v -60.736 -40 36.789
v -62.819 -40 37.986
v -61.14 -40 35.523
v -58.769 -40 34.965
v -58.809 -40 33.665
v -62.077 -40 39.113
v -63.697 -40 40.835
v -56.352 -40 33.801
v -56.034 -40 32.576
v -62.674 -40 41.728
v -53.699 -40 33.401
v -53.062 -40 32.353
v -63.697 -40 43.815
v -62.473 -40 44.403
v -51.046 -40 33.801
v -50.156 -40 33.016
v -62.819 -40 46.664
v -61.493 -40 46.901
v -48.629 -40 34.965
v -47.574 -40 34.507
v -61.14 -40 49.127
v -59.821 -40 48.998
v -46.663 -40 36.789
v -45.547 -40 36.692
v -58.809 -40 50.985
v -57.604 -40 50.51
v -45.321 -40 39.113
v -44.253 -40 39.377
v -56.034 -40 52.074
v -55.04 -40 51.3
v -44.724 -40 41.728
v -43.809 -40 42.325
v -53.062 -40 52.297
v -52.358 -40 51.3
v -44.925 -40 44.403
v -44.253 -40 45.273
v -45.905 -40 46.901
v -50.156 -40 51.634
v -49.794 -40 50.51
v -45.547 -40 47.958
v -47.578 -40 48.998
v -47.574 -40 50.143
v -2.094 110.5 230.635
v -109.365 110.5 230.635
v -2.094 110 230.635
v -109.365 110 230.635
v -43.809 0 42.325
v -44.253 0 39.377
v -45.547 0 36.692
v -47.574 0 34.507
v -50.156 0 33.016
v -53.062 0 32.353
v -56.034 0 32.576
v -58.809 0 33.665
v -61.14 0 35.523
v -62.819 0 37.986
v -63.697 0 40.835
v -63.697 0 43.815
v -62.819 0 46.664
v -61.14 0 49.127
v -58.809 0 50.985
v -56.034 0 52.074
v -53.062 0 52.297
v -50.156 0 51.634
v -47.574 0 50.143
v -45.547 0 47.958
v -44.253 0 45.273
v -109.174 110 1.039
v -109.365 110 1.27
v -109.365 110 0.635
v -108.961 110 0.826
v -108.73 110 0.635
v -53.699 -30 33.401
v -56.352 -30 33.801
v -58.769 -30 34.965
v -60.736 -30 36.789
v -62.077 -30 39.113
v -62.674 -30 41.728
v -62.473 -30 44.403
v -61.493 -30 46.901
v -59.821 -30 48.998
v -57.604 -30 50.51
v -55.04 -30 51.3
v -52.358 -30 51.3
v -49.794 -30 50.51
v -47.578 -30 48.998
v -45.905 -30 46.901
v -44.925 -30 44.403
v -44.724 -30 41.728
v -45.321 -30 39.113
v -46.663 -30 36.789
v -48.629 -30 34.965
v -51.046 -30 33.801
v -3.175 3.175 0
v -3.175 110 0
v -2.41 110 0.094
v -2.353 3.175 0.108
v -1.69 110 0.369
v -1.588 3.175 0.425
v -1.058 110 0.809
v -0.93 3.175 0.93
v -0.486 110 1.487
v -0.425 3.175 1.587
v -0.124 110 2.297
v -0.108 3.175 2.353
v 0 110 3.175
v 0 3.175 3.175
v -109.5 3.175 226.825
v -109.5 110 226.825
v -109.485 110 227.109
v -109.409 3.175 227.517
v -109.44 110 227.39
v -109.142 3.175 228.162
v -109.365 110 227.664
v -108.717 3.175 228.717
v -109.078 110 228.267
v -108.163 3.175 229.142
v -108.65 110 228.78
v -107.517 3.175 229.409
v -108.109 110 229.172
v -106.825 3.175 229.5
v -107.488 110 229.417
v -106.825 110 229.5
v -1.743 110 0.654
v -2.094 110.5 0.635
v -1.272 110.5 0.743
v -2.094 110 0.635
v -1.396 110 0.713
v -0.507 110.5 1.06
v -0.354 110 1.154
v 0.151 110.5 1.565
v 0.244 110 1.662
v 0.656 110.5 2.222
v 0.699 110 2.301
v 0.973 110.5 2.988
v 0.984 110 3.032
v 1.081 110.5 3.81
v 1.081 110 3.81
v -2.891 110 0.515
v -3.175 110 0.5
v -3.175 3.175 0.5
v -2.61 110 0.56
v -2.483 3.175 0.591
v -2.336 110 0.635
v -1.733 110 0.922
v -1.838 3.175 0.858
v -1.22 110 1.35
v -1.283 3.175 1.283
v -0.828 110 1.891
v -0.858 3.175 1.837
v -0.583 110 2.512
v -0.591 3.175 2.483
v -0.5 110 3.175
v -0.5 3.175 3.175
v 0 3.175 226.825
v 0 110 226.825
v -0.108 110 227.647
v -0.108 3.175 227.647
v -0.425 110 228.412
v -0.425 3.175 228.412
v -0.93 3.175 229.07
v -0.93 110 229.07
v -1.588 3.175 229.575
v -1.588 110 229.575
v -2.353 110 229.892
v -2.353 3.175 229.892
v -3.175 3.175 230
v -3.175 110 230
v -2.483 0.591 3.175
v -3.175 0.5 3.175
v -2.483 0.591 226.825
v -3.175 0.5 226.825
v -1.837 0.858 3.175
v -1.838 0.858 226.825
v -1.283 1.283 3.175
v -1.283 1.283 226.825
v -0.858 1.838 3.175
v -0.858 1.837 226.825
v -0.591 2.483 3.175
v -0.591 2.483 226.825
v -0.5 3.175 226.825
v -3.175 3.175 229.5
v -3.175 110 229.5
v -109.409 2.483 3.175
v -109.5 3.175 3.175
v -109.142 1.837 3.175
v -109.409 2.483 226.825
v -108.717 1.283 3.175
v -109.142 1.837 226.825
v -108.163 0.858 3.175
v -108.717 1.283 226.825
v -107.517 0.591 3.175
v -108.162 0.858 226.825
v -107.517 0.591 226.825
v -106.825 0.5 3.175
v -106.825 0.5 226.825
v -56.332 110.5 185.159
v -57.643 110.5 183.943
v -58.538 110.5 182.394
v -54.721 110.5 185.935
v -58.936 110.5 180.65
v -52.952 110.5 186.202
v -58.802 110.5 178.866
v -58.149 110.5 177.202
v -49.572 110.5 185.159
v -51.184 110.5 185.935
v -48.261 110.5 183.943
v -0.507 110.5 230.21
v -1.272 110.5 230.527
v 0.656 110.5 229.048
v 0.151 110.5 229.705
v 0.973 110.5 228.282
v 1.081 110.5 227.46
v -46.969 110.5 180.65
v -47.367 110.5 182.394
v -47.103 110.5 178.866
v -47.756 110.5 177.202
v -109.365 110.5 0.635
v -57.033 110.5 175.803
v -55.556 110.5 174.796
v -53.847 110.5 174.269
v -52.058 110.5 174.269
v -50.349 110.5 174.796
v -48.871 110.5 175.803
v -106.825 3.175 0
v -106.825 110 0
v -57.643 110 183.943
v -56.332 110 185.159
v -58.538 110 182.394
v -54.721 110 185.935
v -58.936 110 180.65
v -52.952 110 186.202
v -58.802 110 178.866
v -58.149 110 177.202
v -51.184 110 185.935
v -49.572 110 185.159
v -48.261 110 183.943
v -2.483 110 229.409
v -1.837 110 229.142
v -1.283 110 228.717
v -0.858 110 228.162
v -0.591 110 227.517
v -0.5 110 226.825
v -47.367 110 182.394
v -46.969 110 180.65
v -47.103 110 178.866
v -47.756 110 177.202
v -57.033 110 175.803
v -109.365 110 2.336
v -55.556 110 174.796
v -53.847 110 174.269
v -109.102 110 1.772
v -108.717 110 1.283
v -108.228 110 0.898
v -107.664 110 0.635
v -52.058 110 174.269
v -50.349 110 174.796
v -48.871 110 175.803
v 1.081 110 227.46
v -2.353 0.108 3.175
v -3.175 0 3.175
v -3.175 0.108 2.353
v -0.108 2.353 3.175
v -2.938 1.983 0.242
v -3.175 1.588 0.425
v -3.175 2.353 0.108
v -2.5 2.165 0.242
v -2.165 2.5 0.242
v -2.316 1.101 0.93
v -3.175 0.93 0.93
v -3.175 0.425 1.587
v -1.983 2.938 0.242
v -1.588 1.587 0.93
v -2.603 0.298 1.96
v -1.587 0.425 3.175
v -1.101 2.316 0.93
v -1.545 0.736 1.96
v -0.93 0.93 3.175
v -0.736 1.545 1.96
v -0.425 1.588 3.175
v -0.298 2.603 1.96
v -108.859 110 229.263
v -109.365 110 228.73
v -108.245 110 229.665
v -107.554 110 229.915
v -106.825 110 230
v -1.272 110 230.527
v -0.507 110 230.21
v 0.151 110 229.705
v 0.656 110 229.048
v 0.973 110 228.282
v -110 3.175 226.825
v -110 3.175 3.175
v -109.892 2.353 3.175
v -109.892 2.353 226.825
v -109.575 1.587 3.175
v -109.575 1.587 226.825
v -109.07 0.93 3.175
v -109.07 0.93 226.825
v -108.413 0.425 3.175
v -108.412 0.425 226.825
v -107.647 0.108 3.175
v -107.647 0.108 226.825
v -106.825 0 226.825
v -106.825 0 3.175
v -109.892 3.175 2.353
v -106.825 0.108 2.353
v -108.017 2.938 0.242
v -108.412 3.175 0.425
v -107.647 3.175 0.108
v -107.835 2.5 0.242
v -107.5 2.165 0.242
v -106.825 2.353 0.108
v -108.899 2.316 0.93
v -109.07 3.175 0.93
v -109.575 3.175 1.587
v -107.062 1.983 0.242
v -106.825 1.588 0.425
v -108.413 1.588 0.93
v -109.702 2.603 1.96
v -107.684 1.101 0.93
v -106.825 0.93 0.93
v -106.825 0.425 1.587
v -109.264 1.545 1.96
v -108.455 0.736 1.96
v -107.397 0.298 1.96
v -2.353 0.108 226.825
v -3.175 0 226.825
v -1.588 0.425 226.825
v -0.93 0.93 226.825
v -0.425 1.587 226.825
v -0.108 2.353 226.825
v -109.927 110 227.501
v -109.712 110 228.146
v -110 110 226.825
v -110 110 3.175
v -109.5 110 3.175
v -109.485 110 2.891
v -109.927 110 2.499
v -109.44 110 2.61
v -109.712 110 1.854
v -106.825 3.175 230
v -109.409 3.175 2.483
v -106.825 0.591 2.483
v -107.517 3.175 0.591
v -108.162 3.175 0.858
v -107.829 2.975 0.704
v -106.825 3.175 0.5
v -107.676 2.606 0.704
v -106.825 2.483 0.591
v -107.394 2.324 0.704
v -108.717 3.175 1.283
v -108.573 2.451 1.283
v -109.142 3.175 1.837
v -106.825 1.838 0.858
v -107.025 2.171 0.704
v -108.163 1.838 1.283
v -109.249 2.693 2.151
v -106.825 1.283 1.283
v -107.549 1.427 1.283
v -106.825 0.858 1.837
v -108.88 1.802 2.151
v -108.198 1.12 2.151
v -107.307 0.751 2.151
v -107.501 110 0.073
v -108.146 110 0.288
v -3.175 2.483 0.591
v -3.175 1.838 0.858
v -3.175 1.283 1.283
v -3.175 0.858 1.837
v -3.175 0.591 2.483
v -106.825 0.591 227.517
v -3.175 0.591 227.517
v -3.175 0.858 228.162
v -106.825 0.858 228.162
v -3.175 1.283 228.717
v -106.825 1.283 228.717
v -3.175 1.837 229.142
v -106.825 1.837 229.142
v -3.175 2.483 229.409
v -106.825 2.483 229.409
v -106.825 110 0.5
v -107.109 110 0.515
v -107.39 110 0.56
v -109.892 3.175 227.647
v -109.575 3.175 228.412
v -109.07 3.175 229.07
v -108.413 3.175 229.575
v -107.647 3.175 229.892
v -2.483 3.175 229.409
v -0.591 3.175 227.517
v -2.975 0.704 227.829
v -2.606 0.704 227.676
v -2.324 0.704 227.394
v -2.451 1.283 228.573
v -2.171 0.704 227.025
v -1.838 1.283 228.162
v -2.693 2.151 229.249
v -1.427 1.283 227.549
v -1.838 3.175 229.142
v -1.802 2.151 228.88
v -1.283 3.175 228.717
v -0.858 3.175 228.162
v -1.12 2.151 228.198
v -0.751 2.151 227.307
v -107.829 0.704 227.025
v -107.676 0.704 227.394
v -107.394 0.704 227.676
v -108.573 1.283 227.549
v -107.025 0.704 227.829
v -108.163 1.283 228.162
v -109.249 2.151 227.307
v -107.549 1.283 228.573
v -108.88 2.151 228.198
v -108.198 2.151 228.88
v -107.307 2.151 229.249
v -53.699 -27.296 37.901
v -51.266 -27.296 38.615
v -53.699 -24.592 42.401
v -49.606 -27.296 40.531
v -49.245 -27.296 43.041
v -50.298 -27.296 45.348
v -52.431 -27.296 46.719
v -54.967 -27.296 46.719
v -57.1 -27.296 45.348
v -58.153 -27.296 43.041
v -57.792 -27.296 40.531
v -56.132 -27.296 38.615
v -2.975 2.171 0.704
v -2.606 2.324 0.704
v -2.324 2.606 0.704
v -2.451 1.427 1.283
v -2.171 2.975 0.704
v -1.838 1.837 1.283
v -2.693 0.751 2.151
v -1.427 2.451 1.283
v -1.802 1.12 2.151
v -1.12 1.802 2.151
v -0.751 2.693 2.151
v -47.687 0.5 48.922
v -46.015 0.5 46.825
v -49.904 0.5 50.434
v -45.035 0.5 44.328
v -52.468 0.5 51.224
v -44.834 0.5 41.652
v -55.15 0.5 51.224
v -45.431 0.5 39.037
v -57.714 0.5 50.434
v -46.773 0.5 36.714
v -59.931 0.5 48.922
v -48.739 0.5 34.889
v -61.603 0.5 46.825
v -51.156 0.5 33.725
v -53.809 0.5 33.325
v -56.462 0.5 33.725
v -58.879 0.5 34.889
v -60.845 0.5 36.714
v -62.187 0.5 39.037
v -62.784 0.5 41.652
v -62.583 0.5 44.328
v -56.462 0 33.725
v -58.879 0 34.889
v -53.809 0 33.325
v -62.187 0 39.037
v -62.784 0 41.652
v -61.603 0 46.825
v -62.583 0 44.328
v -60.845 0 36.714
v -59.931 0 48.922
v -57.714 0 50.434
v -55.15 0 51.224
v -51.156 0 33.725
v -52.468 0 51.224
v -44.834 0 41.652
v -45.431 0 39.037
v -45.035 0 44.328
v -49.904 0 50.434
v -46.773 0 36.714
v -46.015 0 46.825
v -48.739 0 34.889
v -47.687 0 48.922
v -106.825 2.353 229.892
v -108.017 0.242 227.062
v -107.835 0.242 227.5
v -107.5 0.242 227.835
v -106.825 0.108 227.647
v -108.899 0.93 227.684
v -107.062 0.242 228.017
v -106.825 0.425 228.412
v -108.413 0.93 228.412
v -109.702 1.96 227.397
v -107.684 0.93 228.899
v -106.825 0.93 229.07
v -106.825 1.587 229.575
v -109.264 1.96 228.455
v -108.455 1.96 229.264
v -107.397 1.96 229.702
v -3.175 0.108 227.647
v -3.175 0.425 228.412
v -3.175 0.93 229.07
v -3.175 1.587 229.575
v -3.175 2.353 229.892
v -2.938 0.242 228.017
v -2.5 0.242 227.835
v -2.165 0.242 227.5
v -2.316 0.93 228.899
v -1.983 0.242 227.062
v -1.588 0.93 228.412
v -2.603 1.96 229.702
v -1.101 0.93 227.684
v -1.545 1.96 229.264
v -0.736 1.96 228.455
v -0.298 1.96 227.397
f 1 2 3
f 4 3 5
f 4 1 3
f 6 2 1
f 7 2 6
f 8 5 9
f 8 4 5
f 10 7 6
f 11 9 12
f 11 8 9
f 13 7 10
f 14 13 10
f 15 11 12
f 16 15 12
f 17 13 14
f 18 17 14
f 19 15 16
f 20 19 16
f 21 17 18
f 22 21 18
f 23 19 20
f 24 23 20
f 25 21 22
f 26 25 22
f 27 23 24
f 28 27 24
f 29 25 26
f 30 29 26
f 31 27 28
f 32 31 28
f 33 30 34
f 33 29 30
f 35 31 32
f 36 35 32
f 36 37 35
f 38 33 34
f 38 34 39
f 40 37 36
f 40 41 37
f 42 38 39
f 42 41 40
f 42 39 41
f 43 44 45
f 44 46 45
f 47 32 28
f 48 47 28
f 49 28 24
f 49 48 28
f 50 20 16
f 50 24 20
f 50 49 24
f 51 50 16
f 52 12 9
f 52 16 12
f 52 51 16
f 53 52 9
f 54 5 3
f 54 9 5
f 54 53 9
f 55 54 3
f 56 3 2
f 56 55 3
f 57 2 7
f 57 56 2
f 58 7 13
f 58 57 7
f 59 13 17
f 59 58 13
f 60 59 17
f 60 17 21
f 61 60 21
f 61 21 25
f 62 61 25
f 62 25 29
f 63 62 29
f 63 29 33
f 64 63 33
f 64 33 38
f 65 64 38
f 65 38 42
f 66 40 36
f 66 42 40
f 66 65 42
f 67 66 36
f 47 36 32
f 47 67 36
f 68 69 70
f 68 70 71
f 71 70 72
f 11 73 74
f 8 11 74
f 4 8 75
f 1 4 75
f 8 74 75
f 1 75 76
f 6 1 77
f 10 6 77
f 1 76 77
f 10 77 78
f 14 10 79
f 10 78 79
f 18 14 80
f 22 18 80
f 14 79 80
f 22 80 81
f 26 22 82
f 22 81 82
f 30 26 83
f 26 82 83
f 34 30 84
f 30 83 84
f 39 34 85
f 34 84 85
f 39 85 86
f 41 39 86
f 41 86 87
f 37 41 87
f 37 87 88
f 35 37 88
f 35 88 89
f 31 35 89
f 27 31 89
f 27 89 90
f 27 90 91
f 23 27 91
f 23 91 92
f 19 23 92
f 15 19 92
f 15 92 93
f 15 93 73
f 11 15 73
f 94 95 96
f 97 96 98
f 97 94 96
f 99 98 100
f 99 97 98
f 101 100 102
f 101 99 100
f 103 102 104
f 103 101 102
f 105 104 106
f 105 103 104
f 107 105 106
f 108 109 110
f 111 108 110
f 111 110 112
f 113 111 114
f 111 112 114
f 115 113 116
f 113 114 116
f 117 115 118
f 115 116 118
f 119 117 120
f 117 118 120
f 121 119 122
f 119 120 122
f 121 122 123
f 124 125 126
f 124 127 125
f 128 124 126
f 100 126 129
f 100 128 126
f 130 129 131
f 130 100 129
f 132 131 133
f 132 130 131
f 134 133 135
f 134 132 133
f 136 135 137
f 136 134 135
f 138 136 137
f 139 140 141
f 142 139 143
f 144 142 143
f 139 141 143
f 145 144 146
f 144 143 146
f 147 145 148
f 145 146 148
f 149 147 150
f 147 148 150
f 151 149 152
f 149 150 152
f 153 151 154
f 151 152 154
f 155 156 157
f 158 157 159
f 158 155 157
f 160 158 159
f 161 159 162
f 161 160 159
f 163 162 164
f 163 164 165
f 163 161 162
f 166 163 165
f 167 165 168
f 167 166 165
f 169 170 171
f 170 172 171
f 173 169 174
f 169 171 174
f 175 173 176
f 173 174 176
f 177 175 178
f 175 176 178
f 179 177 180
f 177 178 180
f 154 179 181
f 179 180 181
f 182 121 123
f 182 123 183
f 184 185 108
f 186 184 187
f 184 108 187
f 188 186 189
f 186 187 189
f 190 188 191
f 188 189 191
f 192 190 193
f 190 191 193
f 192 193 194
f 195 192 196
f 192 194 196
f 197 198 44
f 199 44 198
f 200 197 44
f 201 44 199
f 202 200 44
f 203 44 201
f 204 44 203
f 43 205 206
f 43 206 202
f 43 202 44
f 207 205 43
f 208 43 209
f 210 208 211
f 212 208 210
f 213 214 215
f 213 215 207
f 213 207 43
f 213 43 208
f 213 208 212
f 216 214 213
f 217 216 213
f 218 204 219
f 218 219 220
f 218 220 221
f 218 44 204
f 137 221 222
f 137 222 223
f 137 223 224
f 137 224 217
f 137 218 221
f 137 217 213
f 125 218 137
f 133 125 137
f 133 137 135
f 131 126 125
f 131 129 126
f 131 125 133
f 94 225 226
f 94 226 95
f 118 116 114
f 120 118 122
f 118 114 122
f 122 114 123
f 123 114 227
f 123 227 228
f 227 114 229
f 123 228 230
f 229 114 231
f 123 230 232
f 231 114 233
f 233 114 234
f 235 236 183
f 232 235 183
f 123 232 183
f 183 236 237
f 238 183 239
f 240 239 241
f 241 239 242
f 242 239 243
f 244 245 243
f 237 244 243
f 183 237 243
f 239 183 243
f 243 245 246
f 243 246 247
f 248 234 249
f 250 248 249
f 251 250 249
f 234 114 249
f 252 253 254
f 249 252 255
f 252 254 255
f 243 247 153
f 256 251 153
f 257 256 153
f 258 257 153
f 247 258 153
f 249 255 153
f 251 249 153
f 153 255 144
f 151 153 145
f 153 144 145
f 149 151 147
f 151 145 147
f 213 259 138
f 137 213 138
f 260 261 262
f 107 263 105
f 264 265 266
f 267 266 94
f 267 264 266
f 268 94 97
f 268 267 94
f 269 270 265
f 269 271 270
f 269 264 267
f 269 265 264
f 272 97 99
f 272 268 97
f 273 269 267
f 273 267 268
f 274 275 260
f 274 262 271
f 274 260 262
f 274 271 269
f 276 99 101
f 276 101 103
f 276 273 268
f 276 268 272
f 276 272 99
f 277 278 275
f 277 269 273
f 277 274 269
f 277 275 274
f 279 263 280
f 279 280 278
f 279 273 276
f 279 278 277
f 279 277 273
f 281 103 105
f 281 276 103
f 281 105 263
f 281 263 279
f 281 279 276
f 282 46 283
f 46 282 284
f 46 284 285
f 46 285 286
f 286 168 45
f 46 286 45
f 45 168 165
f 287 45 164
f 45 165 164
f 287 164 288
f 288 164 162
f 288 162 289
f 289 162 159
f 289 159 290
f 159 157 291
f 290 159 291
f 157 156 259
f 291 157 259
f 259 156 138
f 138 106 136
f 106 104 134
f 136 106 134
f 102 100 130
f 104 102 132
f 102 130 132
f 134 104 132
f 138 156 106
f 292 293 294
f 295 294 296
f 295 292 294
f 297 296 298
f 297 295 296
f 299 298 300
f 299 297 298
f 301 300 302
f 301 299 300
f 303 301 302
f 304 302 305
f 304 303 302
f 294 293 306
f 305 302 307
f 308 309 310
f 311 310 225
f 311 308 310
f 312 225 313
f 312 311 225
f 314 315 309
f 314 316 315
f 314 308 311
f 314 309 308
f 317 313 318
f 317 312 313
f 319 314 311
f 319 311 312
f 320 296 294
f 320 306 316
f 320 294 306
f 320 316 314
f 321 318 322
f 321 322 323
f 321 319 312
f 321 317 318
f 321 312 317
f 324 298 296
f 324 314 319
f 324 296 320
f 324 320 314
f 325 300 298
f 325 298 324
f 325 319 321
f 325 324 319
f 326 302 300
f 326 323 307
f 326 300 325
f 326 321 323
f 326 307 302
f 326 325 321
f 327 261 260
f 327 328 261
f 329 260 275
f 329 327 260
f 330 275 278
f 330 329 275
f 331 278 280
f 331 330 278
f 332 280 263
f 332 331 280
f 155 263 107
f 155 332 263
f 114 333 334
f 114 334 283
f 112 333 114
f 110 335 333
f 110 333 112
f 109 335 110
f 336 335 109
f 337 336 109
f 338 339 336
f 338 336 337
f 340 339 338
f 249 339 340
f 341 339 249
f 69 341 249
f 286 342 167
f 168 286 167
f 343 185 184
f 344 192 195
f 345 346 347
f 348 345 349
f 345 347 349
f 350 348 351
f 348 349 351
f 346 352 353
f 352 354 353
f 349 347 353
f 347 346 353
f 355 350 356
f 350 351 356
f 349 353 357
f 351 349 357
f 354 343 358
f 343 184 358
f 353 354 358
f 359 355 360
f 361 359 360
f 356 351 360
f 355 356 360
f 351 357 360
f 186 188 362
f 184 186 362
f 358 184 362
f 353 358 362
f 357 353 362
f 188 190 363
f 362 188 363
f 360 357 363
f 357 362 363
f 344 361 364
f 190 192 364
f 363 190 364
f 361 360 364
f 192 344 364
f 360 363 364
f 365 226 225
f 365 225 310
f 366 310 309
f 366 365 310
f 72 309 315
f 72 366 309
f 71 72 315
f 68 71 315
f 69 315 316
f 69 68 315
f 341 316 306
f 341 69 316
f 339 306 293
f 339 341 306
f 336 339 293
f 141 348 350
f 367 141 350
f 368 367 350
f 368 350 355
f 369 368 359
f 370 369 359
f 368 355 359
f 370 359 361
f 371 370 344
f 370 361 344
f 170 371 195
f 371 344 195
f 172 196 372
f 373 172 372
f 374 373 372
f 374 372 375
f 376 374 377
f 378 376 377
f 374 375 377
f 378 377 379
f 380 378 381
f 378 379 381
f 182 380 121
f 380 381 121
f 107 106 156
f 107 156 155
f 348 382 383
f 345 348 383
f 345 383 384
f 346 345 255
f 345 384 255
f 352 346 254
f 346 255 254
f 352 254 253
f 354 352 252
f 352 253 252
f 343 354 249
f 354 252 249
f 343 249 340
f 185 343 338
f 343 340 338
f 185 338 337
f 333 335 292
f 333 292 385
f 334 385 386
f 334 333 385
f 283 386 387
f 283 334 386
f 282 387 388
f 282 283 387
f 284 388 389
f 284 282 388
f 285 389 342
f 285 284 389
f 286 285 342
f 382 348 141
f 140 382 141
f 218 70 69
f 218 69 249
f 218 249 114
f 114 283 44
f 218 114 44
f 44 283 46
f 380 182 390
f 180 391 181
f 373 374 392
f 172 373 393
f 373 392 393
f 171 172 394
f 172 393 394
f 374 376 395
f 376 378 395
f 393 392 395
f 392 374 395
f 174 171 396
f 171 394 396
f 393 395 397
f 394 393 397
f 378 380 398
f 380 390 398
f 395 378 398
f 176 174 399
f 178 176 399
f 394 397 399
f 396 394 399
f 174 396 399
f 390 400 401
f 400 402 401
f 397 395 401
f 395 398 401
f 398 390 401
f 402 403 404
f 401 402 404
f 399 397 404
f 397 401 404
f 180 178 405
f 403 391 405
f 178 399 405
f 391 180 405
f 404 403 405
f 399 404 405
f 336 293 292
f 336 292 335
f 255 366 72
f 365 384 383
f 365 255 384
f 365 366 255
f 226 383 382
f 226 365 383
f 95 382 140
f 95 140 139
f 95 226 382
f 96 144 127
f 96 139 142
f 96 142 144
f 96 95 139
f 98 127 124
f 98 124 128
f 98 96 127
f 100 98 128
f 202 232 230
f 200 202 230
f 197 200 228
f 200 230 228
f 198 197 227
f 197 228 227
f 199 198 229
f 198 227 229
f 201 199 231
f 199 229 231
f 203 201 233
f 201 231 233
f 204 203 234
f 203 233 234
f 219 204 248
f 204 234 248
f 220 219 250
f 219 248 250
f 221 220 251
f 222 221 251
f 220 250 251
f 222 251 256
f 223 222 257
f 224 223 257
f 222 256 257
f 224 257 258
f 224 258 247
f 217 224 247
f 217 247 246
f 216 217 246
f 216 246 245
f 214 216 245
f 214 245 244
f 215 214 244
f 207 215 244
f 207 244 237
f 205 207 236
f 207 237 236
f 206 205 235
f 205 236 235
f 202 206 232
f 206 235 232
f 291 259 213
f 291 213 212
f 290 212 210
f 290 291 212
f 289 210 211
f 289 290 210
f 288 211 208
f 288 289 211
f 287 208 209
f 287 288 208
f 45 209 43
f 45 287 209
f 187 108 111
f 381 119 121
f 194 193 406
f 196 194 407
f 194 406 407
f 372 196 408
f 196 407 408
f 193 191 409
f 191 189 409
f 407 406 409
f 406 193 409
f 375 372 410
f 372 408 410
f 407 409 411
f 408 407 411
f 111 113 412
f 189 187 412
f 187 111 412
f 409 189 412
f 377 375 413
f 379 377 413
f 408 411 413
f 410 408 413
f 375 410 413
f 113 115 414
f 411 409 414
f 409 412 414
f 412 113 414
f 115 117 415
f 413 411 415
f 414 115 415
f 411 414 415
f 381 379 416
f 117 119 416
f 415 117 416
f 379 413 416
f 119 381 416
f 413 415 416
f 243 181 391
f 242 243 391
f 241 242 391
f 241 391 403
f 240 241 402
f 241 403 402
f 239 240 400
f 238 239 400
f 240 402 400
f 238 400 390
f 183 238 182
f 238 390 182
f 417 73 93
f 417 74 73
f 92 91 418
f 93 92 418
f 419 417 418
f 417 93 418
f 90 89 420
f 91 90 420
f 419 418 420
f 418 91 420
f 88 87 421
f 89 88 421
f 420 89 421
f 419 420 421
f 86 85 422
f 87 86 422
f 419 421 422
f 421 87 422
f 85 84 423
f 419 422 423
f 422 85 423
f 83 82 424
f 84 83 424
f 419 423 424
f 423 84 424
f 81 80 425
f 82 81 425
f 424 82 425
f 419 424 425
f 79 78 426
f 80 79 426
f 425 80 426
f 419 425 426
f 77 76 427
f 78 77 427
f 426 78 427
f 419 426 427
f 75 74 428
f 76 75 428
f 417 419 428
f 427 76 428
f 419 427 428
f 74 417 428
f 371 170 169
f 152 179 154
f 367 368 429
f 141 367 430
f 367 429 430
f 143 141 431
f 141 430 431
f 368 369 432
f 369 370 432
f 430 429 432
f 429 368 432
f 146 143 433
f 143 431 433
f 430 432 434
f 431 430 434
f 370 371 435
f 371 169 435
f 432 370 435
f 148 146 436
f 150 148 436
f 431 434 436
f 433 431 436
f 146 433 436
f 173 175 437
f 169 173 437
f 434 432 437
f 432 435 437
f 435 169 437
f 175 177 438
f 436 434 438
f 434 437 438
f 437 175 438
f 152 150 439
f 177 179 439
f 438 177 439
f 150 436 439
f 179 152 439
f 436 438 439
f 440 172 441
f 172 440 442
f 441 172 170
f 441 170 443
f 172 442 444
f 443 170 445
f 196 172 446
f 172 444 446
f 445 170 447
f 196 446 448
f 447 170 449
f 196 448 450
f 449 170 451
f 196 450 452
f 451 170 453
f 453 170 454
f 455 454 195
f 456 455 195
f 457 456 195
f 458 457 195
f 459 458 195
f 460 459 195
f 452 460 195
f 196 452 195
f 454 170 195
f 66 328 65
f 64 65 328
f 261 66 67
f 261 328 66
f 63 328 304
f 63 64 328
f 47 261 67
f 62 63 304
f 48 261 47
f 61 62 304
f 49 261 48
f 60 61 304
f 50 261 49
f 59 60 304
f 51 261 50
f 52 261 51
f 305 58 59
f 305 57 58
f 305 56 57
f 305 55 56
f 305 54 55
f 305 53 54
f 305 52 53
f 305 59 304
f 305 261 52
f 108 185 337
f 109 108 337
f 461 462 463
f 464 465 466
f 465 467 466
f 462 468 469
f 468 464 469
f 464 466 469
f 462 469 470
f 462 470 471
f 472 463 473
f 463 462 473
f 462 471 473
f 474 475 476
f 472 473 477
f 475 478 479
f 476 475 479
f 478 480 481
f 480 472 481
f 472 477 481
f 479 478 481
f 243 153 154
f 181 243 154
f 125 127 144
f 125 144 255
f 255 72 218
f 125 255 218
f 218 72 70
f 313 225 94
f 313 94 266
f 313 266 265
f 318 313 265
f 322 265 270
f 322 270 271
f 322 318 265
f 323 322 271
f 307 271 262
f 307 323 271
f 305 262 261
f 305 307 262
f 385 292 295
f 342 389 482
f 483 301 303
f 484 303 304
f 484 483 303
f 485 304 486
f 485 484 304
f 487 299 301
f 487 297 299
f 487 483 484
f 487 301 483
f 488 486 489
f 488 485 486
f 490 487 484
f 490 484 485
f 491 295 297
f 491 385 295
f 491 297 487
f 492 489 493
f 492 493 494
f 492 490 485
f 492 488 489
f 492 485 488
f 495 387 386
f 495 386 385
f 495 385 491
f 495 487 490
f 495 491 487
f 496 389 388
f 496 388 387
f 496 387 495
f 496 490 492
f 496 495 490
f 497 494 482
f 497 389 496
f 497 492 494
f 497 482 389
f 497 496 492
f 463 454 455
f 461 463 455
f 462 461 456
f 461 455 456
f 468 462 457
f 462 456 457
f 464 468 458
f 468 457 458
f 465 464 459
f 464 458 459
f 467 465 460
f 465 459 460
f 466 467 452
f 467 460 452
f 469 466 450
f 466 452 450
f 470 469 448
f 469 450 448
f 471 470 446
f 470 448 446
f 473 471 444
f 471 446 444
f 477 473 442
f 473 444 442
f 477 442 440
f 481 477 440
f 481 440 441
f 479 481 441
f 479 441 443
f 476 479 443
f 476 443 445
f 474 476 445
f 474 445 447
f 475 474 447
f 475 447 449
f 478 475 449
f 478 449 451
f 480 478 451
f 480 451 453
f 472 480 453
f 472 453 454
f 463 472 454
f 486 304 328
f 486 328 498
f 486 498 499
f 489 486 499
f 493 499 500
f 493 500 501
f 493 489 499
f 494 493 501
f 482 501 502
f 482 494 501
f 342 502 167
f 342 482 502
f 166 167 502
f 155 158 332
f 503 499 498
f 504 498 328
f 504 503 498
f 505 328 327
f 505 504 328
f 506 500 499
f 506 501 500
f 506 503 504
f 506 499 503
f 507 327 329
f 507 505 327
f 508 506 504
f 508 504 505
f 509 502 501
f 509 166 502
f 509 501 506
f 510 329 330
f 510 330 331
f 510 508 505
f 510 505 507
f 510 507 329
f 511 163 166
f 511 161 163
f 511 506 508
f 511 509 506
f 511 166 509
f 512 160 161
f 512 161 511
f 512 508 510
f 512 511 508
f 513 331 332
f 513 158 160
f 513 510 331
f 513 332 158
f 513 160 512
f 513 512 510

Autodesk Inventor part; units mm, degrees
ref_plane "YZ Plane" through (0, 0, 0) normal (1, 0, 0) x (0, 1, 0)
ref_plane "XZ Plane" through (0, 0, 0) normal (0, 1, 0) x (-1, 0, 0)
ref_plane "XY Plane" through (0, 0, 0) normal (0, 0, 1) x (1, 0, 0)
sketch "Sketch1" plane through (0, 0, 0) normal (0, 0, 1) x (1, 0, 0)
  line L0 (0, 0) -> (-110, 0)
  line L1 (-110, 0) -> (-110, 110)
  line L2 (-110, 110) -> (0, 110)
  line L3 (0, 110) -> (0, 0)
  dimension "d0" = 110
  dimension "d1" = 110
extrude "Extrusion1" add sketch "Sketch1" along normal blind 230
fillet "Fillet2" radius 3.175 8 edges at (-110, 55, 230) (0, 55, 230) (-55, 0, 230) (-110, 0, 115) (0, 0, 115) (0, 55, 0) (-55, 0, 0) (-110, 55, 0)
shell "Shell1" thickness 0.5 removed faces 1 at (-36.6667, 110, 77.725)
sketch "Sketch2" plane through (-106.825, 110, 0) normal (0, 1, 0) x (1, 0, 0)
  line L0 (-2.54, -230.635) -> (107.9059, -230.635)
  line L1 (107.9059, -230.635) -> (107.9059, -0.635)
  line L2 (107.9059, -0.635) -> (-2.54, -0.635)
  line L3 (-2.54, -0.635) -> (-2.54, -230.635)
  point P0 (106.825, 0)
  point P1 (0, -229.5)
  point P2 (103.65, -3.175)
  dimension "d11" = 230
extrude "Extrusion2" add sketch "Sketch2" along normal blind 0.5
fillet "Fillet4" radius 3.175 2 edges at (1.0809, 110.25, 230.635) (1.0809, 110.25, 0.635)
sketch "Sketch3" plane through (-106.825, 110.5, 0) normal (0, 1, 0) x (1, 0, 0)
  point P0 (106.825, 0)
  point P1 (53.8726, -180.2016)
hole "Hole1" at (-52.9524, 110.5, 180.2016) direction (0, -1, 0) diameter 12 depth 10 tip angle 118
sketch "Sketch4" plane through (-106.825, 0, 3.175) normal (0, -1, 0) x (1, 0, 0)
  point P0 (106.825, -3.175)
  point P1 (53.016, 39.15)
hole "Hole2" at (-53.809, 0, 42.325) direction (0, 1, 0) diameter 18 depth 10 tip angle 118
sketch "Sketch5" plane through (-106.825, 0, 3.175) normal (0, -1, 0) x (1, 0, 0)
  circle A0 centre (53.016, 39.15) radius 9 projected
  circle A1 centre (53.016, 39.15) radius 10
  point P0 (106.825, -3.175)
  dimension "d27" = 20
extrude "Extrusion3" add sketch "Sketch5" along normal blind 40 contours A0 | A1
sketch "Sketch6" plane through (-53.809, -40, 42.325) normal (0, -1, 0) x (1, 0, 0)
  point P0 (53.809, -42.325)
  point P1 (0.11, 0.0758)
hole "Hole3" at (-53.6991, -40, 42.4008) direction (0, 1, 0) diameter 18 depth 10 tip angle 118
properties part number "oil_water_separator"
